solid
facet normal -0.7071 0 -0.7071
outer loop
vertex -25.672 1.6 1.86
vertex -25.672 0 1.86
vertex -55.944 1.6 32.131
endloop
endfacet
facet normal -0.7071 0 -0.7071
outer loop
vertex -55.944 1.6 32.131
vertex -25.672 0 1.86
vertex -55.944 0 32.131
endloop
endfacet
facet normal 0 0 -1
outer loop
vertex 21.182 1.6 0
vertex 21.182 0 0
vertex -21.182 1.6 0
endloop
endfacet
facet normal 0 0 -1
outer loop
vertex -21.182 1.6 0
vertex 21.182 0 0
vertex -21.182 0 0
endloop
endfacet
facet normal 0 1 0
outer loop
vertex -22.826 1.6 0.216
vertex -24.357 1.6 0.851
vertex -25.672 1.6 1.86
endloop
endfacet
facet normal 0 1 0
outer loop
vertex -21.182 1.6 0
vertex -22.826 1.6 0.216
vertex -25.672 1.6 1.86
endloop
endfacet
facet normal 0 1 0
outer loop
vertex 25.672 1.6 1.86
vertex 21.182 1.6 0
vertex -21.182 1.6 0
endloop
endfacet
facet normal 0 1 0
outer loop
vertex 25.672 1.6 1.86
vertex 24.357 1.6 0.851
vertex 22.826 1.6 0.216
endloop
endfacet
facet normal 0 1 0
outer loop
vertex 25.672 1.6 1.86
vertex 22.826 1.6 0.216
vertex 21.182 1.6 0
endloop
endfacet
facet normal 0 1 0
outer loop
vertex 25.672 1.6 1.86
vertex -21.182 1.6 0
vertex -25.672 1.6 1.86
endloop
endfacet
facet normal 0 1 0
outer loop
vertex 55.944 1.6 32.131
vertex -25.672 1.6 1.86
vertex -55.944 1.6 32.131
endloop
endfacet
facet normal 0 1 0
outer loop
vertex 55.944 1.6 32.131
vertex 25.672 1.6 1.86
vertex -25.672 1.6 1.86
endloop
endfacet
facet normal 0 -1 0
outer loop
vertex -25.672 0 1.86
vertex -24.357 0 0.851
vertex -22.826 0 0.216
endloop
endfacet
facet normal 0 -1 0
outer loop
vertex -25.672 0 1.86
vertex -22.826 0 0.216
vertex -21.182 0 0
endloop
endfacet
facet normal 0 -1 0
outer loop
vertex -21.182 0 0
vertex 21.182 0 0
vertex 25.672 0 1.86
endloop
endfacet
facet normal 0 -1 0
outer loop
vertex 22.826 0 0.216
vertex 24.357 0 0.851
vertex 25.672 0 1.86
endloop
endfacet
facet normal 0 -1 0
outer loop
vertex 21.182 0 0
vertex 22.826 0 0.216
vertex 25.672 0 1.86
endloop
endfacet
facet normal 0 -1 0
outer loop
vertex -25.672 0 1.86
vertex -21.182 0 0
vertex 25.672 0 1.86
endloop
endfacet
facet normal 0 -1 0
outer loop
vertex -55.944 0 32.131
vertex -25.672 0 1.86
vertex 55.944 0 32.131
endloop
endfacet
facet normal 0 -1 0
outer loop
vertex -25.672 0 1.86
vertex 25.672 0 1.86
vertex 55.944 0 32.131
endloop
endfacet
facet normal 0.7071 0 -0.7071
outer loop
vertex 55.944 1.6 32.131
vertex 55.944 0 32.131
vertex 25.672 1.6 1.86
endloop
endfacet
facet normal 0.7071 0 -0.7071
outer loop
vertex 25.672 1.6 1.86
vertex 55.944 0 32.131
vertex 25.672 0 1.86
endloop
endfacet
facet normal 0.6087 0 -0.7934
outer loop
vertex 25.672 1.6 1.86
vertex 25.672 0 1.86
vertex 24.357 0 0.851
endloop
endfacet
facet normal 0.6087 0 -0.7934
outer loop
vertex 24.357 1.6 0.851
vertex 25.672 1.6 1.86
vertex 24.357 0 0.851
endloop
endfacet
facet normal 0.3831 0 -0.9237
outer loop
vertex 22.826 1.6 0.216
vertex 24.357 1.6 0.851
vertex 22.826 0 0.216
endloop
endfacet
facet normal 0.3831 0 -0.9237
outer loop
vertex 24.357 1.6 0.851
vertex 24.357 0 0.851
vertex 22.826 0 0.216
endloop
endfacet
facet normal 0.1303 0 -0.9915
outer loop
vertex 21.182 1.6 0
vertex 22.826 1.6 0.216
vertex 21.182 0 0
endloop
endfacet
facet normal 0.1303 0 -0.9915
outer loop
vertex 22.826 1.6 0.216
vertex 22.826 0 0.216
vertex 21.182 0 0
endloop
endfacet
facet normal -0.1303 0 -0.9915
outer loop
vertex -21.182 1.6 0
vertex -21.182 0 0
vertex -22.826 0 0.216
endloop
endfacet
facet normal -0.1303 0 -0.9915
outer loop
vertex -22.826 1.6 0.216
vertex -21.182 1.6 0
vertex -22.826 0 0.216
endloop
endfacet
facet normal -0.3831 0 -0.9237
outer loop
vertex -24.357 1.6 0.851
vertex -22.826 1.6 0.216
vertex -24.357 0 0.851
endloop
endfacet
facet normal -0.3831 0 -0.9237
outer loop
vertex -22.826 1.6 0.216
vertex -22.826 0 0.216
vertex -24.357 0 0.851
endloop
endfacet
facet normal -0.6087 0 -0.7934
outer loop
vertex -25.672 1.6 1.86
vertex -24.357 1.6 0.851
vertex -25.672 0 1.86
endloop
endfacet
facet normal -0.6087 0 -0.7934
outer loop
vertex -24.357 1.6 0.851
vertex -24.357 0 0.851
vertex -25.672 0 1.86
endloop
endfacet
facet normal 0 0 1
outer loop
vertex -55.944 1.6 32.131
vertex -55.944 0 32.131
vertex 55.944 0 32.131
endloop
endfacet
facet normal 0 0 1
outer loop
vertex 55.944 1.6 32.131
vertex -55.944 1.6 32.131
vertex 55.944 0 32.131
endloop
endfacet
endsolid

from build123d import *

# Parameters (mm, degrees)
EXTRUDE1_DEPTH = 1.6002


with BuildPart() as part:
    # Sketch1 → Extrude1 (new body)
    with BuildSketch(Plane(origin=(0, 0, 0), x_dir=(1, 0, 0), z_dir=(0, 1, 0))):
        with BuildLine():
            Line((21.182243879, 0), (-21.182243879, 0))
            ThreePointArc((-21.182243879, 0), (-23.612283674, -0.483364969), (-25.672371939, -1.859871939))
            Line((-25.672371939, -1.859871939), (-55.9435, -32.131))
            Line((-55.9435, -32.131), (55.9435, -32.131))
            Line((55.9435, -32.131), (25.672371939, -1.859871939))
            ThreePointArc((25.672371939, -1.859871939), (23.612283674, -0.483364969), (21.182243879, 0))
        make_face()
    extrude(amount=EXTRUDE1_DEPTH)


solid = part.part
